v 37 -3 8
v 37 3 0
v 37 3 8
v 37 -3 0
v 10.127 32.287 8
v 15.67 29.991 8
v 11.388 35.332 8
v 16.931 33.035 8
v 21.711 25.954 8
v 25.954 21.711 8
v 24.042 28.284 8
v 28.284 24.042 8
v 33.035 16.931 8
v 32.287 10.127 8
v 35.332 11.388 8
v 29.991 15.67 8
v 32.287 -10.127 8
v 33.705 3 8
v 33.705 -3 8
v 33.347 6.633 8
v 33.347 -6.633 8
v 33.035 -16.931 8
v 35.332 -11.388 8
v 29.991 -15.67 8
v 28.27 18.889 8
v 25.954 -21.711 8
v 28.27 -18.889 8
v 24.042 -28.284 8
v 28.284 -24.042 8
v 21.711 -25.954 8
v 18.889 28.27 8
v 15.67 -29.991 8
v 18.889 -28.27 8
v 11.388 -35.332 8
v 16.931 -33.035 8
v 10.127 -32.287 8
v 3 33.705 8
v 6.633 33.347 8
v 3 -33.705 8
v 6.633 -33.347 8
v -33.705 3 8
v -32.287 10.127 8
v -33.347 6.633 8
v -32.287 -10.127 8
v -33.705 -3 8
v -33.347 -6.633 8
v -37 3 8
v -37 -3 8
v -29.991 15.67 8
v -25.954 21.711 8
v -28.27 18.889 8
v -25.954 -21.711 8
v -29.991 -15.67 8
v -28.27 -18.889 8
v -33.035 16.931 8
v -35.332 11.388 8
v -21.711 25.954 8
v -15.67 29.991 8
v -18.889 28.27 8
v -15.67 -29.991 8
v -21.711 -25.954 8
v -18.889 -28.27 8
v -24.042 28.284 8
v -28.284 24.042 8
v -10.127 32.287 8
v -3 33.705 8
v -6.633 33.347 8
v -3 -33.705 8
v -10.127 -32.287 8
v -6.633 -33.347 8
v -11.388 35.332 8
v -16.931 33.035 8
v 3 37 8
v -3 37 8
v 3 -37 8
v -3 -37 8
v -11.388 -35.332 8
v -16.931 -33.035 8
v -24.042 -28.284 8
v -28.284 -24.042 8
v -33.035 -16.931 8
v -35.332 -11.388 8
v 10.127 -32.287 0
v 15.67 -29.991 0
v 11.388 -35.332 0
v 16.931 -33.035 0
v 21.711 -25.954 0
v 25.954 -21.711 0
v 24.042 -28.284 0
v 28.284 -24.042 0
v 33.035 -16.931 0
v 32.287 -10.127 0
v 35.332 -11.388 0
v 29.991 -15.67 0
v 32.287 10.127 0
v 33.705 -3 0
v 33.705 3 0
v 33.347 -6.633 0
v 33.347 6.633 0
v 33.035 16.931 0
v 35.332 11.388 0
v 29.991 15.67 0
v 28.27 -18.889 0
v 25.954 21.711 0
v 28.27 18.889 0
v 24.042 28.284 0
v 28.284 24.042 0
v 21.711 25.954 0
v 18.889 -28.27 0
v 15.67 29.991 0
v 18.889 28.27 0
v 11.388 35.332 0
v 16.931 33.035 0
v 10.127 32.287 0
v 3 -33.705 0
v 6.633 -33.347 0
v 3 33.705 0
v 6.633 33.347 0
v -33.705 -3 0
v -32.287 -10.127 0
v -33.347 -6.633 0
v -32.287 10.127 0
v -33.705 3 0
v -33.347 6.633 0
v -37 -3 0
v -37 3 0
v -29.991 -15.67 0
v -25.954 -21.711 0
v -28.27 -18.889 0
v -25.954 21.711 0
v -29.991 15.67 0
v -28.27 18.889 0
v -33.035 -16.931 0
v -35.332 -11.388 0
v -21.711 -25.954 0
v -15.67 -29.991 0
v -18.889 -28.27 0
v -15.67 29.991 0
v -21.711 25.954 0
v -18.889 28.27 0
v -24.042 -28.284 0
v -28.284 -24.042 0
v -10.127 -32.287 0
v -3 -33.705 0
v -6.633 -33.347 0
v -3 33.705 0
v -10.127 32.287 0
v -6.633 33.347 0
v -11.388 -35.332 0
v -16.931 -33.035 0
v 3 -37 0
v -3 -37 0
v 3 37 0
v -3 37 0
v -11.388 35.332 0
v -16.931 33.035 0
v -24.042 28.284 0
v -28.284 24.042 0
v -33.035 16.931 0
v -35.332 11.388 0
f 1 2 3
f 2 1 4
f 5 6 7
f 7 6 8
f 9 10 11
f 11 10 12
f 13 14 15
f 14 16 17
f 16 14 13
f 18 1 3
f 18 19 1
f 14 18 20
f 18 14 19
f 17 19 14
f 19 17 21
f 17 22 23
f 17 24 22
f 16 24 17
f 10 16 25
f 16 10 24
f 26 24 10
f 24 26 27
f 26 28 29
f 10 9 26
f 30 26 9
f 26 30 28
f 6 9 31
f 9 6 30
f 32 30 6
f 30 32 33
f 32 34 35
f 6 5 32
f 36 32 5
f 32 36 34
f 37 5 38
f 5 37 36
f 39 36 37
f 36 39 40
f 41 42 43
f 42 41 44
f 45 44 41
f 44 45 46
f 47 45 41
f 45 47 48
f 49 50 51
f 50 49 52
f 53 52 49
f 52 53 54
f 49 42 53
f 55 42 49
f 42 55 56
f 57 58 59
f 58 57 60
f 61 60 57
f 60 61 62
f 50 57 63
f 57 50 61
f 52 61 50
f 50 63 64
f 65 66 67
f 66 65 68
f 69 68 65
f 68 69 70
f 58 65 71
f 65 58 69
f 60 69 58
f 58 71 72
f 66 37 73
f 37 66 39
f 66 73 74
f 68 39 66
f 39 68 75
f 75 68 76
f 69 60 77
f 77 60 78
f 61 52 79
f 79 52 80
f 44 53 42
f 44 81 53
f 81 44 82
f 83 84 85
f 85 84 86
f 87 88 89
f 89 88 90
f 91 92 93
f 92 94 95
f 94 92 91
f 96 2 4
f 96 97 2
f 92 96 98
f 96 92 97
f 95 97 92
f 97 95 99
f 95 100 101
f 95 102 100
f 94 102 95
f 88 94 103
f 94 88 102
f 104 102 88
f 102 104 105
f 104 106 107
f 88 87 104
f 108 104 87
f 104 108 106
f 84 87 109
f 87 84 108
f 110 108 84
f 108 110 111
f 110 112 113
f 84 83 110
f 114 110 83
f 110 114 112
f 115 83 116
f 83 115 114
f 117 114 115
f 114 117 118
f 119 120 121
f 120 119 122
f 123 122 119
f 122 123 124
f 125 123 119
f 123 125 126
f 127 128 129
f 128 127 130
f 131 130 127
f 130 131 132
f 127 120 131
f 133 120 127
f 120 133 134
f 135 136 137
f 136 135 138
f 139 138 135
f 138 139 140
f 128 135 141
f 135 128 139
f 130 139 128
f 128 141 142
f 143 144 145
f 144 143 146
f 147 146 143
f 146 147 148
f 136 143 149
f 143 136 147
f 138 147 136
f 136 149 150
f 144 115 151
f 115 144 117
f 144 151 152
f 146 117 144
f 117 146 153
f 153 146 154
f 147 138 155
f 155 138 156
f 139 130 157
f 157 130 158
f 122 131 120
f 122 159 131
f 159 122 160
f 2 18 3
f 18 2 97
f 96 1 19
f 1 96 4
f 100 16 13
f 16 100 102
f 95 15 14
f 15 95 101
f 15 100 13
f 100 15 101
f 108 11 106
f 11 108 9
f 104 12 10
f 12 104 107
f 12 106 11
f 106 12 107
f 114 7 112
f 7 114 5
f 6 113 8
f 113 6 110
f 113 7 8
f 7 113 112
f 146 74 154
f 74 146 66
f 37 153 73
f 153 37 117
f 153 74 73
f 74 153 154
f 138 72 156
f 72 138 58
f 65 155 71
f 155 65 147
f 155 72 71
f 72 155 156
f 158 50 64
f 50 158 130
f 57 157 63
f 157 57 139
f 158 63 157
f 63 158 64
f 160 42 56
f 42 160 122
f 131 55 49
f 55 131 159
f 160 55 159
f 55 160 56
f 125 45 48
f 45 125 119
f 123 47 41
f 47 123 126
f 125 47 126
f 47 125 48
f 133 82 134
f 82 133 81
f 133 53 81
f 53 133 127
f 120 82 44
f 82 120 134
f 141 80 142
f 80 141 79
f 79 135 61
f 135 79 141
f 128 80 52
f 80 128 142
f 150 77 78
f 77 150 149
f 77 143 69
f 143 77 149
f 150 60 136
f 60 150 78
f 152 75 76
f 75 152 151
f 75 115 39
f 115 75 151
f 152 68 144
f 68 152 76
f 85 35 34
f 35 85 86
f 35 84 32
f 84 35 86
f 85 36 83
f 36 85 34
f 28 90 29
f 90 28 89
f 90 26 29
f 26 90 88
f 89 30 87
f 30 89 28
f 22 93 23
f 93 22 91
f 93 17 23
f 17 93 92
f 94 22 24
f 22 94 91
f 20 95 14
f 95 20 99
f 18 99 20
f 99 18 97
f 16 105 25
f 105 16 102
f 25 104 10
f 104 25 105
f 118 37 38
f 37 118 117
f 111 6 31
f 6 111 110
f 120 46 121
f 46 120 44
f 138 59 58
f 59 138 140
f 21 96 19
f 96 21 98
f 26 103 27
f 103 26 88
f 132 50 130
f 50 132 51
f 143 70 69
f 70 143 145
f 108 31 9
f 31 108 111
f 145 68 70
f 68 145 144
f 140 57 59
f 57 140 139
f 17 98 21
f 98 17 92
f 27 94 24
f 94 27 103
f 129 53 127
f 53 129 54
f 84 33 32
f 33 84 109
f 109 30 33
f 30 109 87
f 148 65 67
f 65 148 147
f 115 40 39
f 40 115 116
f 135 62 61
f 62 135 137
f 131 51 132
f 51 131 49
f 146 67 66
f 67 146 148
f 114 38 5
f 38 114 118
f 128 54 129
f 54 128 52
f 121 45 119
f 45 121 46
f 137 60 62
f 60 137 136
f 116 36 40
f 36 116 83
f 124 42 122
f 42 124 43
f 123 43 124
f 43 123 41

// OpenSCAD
$fn = 32;

// ----------------------------------------------------------------------
// Spur blank: plain gear blank
// ----------------------------------------------------------------------

// --- parameters (mm) ---
disc_r = 34;              // blank root radius
disc_t = 8;               // blank thickness
n_teeth = 16;             // stub tooth count
tooth_w = 6;              // tooth width at the root
tooth_h = 3;              // tooth height above the root

out_r = disc_r + tooth_h;  // tip radius
bbox_x = 74.0;  // measured width over the teeth
bbox_y = 74.0;  // measured depth over the teeth

union() {
  cylinder(r = disc_r, h = disc_t);
  for (i = [0 : n_teeth - 1])
    rotate([0, 0, i * 360 / n_teeth])
      translate([disc_r - 1, -tooth_w / 2, 0])
        cube([tooth_h + 1, tooth_w, disc_t]);
}
